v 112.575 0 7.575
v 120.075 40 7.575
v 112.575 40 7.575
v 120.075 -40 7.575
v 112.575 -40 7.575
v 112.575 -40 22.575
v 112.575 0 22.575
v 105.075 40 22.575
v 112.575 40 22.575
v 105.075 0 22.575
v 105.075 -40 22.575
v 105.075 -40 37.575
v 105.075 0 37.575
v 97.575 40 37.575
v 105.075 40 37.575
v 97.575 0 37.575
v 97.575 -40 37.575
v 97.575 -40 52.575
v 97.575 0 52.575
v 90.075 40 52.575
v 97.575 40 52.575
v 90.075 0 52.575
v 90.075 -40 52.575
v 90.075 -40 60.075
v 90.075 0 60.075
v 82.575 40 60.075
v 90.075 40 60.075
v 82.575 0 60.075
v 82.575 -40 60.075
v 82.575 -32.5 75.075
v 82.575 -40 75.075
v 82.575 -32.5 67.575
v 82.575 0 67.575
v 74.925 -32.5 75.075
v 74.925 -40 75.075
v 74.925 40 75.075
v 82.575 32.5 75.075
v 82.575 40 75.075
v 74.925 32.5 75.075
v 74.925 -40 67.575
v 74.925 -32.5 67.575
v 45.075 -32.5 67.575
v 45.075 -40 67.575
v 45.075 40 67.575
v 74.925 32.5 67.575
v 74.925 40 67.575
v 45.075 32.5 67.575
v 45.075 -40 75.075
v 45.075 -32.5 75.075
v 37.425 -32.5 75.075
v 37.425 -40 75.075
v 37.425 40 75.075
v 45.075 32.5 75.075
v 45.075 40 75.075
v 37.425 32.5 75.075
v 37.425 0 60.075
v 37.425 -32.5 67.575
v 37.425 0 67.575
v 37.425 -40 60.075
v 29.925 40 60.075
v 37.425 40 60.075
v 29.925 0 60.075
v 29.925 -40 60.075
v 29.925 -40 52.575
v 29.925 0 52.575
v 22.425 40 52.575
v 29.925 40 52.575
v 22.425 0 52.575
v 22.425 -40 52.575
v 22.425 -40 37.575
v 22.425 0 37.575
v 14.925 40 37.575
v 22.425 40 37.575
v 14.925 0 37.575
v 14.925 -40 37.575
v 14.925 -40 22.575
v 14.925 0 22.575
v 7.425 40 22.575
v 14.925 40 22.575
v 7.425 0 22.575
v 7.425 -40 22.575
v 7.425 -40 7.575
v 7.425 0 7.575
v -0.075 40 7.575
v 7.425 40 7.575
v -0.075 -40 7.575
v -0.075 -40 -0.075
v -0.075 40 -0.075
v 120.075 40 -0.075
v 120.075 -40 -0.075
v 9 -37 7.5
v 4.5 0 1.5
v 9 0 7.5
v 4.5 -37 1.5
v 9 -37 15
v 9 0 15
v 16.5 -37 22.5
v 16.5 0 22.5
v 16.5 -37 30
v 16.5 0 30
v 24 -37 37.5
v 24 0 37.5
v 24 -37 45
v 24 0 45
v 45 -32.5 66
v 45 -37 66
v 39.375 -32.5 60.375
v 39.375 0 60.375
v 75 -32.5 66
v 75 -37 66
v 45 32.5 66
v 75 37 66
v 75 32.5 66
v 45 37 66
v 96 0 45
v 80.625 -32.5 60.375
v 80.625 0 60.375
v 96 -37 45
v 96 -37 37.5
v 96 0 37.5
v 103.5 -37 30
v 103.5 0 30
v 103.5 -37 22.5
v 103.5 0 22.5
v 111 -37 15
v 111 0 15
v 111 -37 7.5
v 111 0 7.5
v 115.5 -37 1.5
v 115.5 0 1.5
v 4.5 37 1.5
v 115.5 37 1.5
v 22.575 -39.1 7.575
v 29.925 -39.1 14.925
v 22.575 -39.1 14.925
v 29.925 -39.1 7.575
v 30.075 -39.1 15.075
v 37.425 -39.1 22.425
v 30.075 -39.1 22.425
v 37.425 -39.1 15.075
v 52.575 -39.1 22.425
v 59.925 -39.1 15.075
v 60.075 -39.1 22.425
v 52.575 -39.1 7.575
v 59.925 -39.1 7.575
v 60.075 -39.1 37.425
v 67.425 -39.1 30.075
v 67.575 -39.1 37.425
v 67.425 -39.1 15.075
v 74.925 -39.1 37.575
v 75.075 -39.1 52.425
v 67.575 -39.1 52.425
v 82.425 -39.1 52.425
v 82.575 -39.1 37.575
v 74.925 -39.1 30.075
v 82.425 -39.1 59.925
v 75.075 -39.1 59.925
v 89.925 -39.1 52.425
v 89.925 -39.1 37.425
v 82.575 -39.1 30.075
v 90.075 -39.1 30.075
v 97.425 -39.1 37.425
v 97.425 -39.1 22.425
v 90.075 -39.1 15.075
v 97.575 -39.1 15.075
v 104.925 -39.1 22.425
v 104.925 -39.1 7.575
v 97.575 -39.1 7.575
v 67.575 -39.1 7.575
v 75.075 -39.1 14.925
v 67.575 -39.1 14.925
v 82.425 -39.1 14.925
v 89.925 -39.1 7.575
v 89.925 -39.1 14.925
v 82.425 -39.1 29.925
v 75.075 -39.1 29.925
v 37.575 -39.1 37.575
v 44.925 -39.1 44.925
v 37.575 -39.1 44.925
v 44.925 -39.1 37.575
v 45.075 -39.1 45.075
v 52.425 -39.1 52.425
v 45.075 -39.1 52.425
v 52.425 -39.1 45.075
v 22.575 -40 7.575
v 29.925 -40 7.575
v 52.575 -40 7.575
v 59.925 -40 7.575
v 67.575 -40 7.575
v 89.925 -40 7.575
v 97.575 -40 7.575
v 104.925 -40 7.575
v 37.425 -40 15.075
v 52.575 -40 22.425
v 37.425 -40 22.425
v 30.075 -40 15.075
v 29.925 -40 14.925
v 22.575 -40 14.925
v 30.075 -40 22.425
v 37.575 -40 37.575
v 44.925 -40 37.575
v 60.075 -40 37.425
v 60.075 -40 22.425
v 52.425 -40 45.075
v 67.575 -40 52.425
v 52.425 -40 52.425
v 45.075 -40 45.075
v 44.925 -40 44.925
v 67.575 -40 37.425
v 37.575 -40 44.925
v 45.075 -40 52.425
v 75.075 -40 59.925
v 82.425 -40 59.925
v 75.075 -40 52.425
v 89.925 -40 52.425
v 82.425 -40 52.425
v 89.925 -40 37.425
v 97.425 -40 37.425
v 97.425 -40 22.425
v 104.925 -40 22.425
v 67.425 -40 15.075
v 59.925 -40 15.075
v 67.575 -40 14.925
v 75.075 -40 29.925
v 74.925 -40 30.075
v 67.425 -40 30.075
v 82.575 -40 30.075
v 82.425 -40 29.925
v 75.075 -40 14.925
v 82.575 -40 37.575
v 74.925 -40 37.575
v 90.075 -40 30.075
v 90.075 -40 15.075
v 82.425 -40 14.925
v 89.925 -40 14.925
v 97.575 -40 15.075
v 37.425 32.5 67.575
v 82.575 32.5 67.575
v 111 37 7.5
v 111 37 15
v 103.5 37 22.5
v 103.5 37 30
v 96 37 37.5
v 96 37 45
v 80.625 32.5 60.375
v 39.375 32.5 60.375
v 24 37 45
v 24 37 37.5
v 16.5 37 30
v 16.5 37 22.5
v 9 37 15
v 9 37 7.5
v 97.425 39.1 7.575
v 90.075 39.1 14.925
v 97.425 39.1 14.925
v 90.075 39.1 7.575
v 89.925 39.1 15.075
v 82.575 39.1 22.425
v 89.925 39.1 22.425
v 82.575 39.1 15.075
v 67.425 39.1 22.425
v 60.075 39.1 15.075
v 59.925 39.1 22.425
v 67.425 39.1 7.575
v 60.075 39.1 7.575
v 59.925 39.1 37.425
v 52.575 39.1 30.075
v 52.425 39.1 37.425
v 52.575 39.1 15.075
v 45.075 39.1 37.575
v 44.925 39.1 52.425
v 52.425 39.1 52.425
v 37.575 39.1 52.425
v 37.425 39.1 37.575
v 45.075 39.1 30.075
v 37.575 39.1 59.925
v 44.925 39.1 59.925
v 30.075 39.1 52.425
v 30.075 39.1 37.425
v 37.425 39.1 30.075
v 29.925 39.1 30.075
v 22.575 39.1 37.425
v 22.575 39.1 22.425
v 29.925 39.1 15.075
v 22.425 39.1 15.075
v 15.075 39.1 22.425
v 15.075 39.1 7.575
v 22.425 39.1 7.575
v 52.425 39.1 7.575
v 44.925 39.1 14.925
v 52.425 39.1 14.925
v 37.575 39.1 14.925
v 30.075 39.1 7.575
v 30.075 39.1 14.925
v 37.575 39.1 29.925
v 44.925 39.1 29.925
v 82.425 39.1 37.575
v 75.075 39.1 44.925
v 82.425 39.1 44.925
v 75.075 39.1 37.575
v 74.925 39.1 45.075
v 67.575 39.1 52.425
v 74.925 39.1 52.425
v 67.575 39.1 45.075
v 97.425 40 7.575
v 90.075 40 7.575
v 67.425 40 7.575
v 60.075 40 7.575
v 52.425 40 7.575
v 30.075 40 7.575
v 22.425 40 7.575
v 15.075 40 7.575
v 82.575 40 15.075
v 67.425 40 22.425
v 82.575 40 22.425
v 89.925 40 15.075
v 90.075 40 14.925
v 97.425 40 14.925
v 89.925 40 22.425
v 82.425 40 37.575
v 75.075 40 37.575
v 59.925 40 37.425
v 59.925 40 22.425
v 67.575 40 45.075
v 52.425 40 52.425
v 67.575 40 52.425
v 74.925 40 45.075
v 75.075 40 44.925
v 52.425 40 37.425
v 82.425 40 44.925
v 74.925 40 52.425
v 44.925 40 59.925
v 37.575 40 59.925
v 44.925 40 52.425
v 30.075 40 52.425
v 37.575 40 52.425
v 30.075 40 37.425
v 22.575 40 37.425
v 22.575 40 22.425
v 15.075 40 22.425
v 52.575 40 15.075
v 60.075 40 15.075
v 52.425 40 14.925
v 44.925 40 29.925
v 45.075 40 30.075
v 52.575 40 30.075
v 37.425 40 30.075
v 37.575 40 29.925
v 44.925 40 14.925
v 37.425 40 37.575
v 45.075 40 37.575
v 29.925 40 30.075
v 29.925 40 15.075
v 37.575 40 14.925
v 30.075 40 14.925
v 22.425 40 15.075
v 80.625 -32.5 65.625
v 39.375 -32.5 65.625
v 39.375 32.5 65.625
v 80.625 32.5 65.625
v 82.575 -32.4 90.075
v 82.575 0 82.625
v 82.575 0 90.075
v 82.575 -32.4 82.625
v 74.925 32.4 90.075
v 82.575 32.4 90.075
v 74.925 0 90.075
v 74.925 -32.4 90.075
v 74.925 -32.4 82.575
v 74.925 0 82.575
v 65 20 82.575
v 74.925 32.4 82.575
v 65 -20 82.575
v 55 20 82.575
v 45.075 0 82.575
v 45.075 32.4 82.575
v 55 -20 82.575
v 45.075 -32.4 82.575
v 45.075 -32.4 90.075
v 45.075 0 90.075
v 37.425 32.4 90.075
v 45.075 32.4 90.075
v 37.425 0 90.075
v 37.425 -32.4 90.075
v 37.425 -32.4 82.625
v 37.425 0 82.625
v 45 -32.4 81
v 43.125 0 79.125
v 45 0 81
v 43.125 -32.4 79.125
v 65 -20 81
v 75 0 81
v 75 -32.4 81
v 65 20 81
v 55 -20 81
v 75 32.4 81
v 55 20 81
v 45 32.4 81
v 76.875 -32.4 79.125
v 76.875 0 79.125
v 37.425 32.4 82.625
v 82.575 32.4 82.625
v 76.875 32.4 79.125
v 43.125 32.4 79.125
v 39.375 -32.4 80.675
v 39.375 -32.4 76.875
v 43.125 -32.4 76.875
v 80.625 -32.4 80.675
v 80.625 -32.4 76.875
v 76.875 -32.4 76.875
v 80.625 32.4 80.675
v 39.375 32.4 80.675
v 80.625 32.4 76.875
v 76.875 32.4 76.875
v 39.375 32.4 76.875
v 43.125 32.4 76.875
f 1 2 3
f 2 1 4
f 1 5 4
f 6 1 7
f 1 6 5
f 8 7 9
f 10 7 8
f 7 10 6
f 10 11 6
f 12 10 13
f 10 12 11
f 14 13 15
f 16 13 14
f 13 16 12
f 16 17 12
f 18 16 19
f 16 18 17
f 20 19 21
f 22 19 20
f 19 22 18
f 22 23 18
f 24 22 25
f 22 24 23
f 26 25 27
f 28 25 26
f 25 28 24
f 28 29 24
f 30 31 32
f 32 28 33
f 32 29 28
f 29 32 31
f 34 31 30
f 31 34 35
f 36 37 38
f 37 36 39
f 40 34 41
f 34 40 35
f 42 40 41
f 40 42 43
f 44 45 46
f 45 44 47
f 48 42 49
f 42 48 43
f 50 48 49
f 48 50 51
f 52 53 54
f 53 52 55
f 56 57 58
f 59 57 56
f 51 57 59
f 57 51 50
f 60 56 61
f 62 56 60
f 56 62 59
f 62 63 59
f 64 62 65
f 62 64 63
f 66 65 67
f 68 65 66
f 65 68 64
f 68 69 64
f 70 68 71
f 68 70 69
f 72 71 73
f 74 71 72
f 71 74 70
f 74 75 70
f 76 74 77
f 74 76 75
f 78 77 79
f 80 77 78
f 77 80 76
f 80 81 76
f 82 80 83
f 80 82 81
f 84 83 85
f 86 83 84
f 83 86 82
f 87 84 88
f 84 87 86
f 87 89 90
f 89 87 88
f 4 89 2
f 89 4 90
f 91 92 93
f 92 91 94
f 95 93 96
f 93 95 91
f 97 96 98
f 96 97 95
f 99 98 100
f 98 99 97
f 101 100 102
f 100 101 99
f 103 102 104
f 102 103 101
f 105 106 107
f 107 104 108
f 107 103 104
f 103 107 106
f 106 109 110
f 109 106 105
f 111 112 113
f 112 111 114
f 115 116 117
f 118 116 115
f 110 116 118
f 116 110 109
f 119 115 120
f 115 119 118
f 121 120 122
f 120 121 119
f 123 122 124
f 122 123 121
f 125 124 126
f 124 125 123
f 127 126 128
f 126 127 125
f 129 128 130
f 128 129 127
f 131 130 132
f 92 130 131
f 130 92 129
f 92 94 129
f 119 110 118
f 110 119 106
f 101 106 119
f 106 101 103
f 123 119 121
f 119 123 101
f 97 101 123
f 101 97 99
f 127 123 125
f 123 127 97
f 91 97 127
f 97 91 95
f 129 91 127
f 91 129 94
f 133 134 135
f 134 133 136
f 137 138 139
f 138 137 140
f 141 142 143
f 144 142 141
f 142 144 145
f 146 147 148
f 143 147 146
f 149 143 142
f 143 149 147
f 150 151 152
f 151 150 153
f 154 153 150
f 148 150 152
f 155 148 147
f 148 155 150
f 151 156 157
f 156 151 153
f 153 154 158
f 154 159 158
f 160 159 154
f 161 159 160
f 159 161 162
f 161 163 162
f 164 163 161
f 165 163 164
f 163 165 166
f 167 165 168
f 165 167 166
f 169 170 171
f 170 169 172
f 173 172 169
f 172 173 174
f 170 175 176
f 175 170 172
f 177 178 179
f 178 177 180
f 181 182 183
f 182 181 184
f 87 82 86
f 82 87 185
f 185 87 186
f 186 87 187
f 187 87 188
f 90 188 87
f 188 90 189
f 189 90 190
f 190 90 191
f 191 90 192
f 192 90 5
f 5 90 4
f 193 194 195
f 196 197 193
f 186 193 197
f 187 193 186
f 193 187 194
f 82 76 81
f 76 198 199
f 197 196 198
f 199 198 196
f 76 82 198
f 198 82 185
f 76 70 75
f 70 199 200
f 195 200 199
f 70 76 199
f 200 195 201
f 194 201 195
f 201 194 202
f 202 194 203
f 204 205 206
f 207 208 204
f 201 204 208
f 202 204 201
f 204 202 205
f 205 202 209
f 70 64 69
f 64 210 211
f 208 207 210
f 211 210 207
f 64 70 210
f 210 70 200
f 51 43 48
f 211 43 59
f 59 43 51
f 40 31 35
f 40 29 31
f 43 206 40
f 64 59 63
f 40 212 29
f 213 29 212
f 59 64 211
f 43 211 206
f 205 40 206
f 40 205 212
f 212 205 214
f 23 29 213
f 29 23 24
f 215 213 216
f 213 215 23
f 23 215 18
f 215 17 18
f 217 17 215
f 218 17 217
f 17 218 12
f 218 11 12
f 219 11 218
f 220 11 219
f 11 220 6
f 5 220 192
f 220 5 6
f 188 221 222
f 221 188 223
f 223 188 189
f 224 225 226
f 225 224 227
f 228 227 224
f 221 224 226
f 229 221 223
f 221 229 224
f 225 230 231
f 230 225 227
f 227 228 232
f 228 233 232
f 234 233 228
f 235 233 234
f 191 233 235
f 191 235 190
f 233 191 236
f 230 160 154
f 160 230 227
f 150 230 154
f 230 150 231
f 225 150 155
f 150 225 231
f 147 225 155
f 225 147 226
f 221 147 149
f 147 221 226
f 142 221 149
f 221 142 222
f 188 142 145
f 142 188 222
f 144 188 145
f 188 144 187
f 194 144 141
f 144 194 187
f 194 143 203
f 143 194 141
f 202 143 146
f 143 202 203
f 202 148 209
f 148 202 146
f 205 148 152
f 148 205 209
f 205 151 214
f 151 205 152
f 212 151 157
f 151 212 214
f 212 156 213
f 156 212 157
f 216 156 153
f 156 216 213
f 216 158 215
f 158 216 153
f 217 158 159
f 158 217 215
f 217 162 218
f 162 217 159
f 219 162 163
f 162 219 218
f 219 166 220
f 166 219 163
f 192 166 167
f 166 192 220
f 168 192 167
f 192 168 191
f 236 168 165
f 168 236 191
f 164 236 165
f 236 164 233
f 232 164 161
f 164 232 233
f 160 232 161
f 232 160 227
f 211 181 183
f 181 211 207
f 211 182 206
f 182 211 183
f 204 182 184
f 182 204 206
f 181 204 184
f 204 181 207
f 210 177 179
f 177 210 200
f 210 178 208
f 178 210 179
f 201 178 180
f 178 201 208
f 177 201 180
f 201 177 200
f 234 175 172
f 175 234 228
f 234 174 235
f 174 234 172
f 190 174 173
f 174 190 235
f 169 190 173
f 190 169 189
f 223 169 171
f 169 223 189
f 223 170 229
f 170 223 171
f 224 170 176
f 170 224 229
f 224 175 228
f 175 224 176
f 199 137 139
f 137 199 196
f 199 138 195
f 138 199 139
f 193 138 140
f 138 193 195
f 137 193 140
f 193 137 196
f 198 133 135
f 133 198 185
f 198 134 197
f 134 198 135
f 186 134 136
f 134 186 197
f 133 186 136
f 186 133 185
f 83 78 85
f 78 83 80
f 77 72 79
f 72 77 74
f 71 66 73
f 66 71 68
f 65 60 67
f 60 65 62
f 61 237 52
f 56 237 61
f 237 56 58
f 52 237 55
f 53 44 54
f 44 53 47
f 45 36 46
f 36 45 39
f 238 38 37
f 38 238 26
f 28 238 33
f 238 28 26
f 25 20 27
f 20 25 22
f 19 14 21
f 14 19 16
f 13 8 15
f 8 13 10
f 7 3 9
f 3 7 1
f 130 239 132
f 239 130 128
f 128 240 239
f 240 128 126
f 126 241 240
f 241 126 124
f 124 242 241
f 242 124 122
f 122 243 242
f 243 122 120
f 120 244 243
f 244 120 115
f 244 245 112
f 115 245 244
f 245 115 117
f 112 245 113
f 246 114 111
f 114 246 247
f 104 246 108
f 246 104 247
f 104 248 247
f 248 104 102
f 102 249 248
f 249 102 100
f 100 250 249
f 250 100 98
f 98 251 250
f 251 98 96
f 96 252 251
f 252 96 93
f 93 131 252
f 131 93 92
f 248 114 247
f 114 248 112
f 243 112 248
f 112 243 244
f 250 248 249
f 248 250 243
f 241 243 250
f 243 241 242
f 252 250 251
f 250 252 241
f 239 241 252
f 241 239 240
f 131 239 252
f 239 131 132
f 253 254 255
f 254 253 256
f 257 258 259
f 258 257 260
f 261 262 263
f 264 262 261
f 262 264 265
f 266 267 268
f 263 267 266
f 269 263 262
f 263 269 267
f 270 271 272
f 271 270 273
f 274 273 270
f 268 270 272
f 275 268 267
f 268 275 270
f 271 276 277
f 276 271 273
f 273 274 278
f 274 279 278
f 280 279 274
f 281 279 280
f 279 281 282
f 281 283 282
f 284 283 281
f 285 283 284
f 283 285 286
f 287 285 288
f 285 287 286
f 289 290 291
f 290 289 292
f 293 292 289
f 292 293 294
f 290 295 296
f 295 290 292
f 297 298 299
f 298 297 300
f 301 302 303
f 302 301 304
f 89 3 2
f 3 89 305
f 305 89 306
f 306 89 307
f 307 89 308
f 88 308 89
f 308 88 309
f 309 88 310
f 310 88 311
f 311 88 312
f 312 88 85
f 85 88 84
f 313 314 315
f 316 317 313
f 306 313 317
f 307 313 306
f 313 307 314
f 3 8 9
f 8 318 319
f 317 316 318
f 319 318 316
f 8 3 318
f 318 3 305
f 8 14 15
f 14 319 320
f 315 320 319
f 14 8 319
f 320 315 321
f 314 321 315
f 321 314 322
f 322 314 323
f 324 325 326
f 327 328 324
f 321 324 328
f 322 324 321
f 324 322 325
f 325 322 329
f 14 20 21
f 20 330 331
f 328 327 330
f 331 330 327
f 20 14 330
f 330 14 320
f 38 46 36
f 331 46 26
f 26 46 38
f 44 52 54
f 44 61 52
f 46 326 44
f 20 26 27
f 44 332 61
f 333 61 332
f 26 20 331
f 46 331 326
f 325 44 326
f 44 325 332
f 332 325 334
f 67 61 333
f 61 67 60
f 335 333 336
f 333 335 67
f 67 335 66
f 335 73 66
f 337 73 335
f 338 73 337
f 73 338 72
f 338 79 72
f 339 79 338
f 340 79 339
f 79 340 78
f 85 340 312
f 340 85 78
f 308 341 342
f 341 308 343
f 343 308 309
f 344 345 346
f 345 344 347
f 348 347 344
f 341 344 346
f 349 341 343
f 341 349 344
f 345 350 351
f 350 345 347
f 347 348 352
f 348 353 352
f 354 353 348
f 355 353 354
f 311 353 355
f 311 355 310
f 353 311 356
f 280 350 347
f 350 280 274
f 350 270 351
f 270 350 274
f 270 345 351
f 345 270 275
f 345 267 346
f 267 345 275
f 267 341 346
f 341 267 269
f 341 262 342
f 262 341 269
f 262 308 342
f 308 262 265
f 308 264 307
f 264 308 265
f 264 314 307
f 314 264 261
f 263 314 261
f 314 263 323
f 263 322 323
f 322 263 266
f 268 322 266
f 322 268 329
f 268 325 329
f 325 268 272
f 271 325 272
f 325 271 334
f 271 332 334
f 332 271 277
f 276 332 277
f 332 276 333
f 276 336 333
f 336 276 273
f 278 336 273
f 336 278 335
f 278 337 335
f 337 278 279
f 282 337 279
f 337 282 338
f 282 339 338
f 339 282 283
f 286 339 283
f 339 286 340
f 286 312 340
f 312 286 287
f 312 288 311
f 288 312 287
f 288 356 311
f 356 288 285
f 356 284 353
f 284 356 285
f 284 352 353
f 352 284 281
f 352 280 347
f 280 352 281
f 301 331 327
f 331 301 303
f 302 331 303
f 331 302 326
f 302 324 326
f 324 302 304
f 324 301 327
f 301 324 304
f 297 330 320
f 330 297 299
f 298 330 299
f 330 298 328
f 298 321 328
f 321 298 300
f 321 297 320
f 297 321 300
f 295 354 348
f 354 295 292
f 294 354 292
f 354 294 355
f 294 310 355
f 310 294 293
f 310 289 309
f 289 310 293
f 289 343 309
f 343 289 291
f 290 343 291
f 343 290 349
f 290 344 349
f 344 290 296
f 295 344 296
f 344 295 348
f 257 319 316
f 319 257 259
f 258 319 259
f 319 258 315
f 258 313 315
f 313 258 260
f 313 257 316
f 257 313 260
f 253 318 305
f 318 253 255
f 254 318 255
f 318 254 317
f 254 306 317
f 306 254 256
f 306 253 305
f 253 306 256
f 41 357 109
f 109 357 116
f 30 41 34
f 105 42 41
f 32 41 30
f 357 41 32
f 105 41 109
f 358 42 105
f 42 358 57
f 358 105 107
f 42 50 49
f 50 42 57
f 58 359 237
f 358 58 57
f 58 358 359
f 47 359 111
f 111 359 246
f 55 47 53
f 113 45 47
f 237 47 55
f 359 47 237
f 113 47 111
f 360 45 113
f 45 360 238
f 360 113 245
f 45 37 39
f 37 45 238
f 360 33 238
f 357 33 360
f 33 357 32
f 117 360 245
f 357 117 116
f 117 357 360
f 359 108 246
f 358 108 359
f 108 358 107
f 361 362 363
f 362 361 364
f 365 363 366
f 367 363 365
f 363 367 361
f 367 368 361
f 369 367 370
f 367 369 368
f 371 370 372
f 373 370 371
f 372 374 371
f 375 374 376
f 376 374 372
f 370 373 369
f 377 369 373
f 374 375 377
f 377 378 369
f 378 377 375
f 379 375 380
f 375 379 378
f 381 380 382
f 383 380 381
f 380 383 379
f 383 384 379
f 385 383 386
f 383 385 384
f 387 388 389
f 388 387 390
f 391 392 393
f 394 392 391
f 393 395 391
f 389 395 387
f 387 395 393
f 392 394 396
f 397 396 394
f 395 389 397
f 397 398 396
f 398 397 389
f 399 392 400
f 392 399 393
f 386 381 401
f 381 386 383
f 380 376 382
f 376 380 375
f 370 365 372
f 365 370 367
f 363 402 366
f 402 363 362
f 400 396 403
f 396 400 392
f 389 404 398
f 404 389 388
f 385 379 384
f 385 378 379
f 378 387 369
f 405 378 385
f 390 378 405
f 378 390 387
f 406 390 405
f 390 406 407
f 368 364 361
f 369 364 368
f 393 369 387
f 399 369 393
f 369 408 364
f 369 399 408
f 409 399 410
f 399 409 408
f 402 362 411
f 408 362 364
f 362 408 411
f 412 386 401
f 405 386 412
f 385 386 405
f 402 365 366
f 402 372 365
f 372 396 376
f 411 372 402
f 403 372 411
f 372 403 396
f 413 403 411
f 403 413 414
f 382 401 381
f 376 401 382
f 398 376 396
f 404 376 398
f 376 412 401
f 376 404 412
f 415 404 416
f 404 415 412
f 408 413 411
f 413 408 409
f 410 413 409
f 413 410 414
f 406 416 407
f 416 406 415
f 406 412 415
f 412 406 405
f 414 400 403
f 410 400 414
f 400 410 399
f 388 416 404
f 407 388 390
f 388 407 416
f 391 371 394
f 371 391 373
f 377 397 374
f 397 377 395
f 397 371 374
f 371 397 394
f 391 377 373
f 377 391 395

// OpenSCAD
module pixelart(l) {
	for (y = [0 : len(l)-1]) for (x = [0 : len(l[y])-1])
		if (l[y][x] == 1) translate([x - 0.01, -y - 1.01]) square([1.02, 1.02]);
}

module zelti() {
	pixelart([
		[0, 0, 0, 0, 0, 1, 0, 0, 0, 0, 1, 0, 0, 0, 0, 0],
		[0, 0, 0, 0, 0, 1, 1, 1, 1, 1, 1, 0, 0, 0, 0, 0],
		[0, 0, 0, 0, 1, 1, 1, 1, 1, 1, 0, 1, 0, 0, 0, 0],
		[0, 0, 0, 1, 1, 1, 0, 1, 1, 0, 0, 0, 1, 0, 0, 0],
		[0, 0, 0, 1, 1, 0, 1, 1, 1, 0, 0, 0, 1, 0, 0, 0],
		[0, 0, 1, 1, 1, 1, 1, 1, 0, 0, 1, 0, 0, 1, 0, 0],
		[0, 0, 1, 1, 1, 1, 1, 1, 0, 1, 0, 1, 0, 1, 0, 0],
		[0, 1, 1, 1, 0, 1, 1, 0, 0, 1, 0, 1, 0, 0, 1, 0],
		[0, 1, 1, 0, 1, 1, 1, 0, 1, 0, 0, 0, 1, 0, 1, 0],
		[1, 1, 1, 1, 1, 1, 1, 1, 1, 1, 1, 1, 1, 1, 1, 1],
	]);
}

module zelti_filled() {
	pixelart([
		[0, 0, 0, 0, 0, 1, 0, 0, 0, 0, 1, 0, 0, 0, 0, 0],
		[0, 0, 0, 0, 0, 1, 1, 1, 1, 1, 1, 0, 0, 0, 0, 0],
		[0, 0, 0, 0, 1, 1, 1, 1, 1, 1, 1, 1, 0, 0, 0, 0],
		[0, 0, 0, 1, 1, 1, 1, 1, 1, 1, 1, 1, 1, 0, 0, 0],
		[0, 0, 0, 1, 1, 1, 1, 1, 1, 1, 1, 1, 1, 0, 0, 0],
		[0, 0, 1, 1, 1, 1, 1, 1, 1, 1, 1, 1, 1, 1, 0, 0],
		[0, 0, 1, 1, 1, 1, 1, 1, 1, 1, 1, 1, 1, 1, 0, 0],
		[0, 1, 1, 1, 1, 1, 1, 1, 1, 1, 1, 1, 1, 1, 1, 0],
		[0, 1, 1, 1, 1, 1, 1, 1, 1, 1, 1, 1, 1, 1, 1, 0],
		[1, 1, 1, 1, 1, 1, 1, 1, 1, 1, 1, 1, 1, 1, 1, 1],
	]);
}

module zelti_hollow() {
	difference() {
		zelti_filled();
		polygon([
			[0.6, -9.8],
			[1.2, -9],
			[1.2, -8],
			[2.2, -7],
			[2.2, -6],
			[3.2, -5],
			[3.2, -4],
			[6, -1.2],
			[10, -1.2],
			[12.8, -4],
			[12.8, -5],
			[13.8, -6],
			[13.8, -7],
			[14.8, -8],
			[14.8, -9],
			[15.4, -9.8],
		]);
	}
}

r  = 7.5;
w  = r * 16;
h  = r * 10;
d1 = 37;
d2 = 2;
d3 = 1;

module zelti_raw() {
	for (i = [0, 1]) translate([i*w, 0, 0]) rotate([0, 0, i*180]) {
		translate([0, 0, 0]) rotate([90, 0, 0]) linear_extrude(d1 + 0.1, convexity = 20) scale(r) translate([0, 10]) zelti_hollow();
		translate([0, -d1, 0]) rotate([90, 0, 0]) linear_extrude(d2 + 0.1, convexity = 20) scale(r) translate([0, 10]) zelti_filled();
		translate([0, -(d1 + d2 - 0.1), 0]) rotate([90, 0, 0]) linear_extrude(d3 + 0.1, convexity = 20) scale(r) translate([0, 10]) zelti();
	}
}

module zelti_bottom() {
	dtop = 2*(d1 + d2 + d3 - r);
	difference() {
		zelti_raw();
		translate([w/2, 0, 1.4*h]) rotate([90, 0, 0]) cylinder(d = w, h = dtop, center = true, $fn = 4);
		translate([w/2, 0, h]) cube([5.5*r, dtop, h], center = true);
	}
}

module zelti_top() {
	dtop = 2*(d1 + d2 + d3 - r);
	difference() {
		union() {
			intersection() {
				zelti_raw();
				translate([w/2, 0, 1.4*h]) rotate([90, 0, 0]) cylinder(d = w - 0.1, h = dtop - 0.2, center = true, $fn = 4);
			}
			difference() {
				translate([w/2 - 2.75*r, -dtop/2 + 0.1, h - 1.75*r]) cube([5.5*r, dtop - 0.2, 0.75*r]);
				translate([w/2 - 2.25*r, -dtop/2, h - 2*r]) cube([4.5*r, dtop, 1*r]);
			}
		}
		translate([w/2, 0, 0]) cube([10, 40, 250], center = true);
	}
}

zelti_bottom();
translate([0, 0, 2*r]) zelti_top();
